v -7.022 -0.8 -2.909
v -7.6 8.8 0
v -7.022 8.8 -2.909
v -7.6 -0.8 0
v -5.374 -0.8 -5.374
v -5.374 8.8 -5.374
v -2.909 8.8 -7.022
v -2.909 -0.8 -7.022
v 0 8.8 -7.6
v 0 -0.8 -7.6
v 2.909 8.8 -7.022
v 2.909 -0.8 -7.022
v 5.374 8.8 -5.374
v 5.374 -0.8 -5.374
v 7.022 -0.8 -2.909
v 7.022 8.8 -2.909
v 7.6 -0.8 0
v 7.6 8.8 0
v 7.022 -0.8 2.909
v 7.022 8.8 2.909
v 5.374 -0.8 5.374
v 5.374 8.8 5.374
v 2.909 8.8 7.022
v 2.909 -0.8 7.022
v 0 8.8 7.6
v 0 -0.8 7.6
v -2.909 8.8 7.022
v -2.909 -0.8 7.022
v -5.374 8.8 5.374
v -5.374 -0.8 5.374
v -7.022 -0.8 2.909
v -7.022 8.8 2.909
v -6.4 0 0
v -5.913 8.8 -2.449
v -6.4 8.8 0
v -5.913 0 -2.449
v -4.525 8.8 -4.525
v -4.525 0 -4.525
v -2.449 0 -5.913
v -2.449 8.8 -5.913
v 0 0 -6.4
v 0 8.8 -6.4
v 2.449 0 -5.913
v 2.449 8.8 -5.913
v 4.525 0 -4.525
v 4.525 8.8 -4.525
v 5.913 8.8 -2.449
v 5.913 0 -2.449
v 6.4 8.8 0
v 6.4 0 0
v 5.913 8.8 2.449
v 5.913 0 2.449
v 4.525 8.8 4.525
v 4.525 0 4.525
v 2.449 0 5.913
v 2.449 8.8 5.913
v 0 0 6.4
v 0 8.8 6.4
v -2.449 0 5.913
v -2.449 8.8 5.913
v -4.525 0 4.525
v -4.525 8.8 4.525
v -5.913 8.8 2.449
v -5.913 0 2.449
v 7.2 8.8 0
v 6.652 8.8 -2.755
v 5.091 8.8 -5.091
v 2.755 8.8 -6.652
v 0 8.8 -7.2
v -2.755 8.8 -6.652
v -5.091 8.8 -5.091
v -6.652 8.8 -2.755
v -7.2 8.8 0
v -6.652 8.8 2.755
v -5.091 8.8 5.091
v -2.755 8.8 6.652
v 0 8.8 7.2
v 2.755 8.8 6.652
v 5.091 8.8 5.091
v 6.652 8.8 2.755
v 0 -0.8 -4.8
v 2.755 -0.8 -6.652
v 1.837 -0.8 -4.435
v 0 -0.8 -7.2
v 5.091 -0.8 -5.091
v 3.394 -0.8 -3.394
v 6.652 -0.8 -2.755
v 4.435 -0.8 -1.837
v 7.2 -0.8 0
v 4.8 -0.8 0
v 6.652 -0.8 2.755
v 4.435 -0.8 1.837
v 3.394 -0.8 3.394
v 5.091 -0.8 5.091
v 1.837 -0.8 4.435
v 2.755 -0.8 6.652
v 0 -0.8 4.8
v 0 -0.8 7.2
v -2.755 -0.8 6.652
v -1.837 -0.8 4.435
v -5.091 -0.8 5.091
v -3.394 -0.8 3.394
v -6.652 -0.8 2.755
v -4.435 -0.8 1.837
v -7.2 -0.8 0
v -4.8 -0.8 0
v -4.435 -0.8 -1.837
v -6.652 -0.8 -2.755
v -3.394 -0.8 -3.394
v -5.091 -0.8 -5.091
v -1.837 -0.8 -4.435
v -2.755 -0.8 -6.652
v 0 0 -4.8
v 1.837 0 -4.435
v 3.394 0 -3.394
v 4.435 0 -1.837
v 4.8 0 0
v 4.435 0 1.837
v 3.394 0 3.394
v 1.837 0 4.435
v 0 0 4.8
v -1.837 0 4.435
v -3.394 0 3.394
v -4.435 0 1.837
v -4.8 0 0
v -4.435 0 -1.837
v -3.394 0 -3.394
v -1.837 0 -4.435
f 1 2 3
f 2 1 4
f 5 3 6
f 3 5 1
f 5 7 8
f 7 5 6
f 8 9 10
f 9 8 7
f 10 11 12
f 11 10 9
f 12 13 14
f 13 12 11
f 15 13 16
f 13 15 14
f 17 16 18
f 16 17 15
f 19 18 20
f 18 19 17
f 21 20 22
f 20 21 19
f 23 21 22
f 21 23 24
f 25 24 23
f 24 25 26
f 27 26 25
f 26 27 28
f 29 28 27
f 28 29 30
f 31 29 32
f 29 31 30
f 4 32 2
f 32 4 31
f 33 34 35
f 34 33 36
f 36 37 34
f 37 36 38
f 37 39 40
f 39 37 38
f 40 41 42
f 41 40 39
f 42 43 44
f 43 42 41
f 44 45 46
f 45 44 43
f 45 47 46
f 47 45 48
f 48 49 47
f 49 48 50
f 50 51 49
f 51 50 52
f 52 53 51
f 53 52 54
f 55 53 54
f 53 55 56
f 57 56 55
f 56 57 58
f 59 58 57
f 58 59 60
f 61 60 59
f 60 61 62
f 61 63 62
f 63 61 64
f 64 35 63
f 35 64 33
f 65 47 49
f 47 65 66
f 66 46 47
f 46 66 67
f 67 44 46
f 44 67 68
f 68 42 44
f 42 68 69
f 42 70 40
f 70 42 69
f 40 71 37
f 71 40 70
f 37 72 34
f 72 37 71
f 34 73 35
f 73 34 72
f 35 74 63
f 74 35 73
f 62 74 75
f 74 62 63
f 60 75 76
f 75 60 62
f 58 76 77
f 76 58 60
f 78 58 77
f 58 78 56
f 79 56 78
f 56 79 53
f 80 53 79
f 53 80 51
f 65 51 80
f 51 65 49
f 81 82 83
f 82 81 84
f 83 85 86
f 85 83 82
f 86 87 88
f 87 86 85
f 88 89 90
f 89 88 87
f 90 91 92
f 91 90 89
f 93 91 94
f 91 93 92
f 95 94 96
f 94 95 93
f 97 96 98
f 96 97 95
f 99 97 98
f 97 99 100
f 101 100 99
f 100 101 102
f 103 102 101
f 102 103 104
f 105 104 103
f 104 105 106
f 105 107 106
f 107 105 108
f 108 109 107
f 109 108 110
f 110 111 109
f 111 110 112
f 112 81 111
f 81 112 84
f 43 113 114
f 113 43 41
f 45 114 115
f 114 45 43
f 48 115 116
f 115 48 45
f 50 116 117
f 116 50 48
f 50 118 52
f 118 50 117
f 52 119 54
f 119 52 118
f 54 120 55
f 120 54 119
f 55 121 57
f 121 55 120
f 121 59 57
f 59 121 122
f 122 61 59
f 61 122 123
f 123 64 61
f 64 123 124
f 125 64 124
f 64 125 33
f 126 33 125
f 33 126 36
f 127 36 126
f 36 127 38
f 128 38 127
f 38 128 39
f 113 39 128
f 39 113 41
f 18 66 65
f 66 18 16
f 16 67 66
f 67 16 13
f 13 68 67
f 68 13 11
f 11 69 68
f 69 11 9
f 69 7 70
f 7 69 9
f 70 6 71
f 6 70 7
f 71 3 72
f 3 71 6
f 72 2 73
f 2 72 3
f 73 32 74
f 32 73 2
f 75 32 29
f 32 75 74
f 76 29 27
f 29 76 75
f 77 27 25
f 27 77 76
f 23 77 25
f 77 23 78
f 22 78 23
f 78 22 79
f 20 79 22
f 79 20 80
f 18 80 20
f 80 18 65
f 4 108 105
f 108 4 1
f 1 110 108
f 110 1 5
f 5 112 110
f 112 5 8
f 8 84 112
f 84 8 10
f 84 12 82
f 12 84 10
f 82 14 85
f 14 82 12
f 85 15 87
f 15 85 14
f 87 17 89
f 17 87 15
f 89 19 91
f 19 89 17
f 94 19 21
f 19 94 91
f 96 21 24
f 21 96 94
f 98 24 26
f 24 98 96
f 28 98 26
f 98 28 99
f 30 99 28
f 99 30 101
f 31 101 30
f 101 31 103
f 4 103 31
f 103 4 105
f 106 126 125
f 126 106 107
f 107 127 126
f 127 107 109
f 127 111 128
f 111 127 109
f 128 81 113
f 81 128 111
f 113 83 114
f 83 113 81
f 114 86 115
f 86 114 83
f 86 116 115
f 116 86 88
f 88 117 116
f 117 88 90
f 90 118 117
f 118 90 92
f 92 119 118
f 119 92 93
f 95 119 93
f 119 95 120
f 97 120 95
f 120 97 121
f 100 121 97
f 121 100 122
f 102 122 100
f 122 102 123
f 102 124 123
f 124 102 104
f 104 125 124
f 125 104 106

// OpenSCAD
// file: ../p/4-4edge.scad
use <../lib.scad>
function ldraw_lib__4_4edge() = [
// 0 Circle 1.0
// 0 Name: 4-4edge.dat
// 0 Author: James Jessiman
// 0 !LDRAW_ORG Primitive UPDATE 2017-01
// 0 !LICENSE Licensed under CC BY 4.0 : see CAreadme.txt
// 
// 0 BFC CERTIFY CCW
  [0,"BFC","CERTIFY"],
  [0,"BFC","CCW"],
// 
// 0 !HISTORY 1998-12-15 [PTadmin] Official Update 1998-10
// 0 !HISTORY 2005-12-28 [PTadmin] Official Update 2005-01
// 0 !HISTORY 2007-06-24 [PTadmin] Header formatted for Contributor Agreement
// 0 !HISTORY 2008-07-01 [PTadmin] Official Update 2008-01
// 0 !HISTORY 2017-01-15 [Steffen] BFCed
// 0 !HISTORY 2017-12-30 [PTadmin] Official Update 2017-01
// 
// 
// 2 24 1 0 0 0.9239 0 0.3827
  [2,24,1,0,0,0.9239,0,0.3827],
// 2 24 0.9239 0 0.3827 0.7071 0 0.7071
  [2,24,0.9239,0,0.3827,0.7071,0,0.7071],
// 2 24 0.7071 0 0.7071 0.3827 0 0.9239
  [2,24,0.7071,0,0.7071,0.3827,0,0.9239],
// 2 24 0.3827 0 0.9239 0 0 1
  [2,24,0.3827,0,0.9239,0,0,1],
// 2 24 0 0 1 -0.3827 0 0.9239
  [2,24,0,0,1,-0.3827,0,0.9239],
// 2 24 -0.3827 0 0.9239 -0.7071 0 0.7071
  [2,24,-0.3827,0,0.9239,-0.7071,0,0.7071],
// 2 24 -0.7071 0 0.7071 -0.9239 0 0.3827
  [2,24,-0.7071,0,0.7071,-0.9239,0,0.3827],
// 2 24 -0.9239 0 0.3827 -1 0 -0
  [2,24,-0.9239,0,0.3827,-1,0,-0],
// 2 24 -1 0 -0 -0.9239 0 -0.3827
  [2,24,-1,0,-0,-0.9239,0,-0.3827],
// 2 24 -0.9239 0 -0.3827 -0.7071 0 -0.7071
  [2,24,-0.9239,0,-0.3827,-0.7071,0,-0.7071],
// 2 24 -0.7071 0 -0.7071 -0.3827 0 -0.9239
  [2,24,-0.7071,0,-0.7071,-0.3827,0,-0.9239],
// 2 24 -0.3827 0 -0.9239 0 0 -1
  [2,24,-0.3827,0,-0.9239,0,0,-1],
// 2 24 0 0 -1 0.3827 0 -0.9239
  [2,24,0,0,-1,0.3827,0,-0.9239],
// 2 24 0.3827 0 -0.9239 0.7071 0 -0.7071
  [2,24,0.3827,0,-0.9239,0.7071,0,-0.7071],
// 2 24 0.7071 0 -0.7071 0.9239 0 -0.3827
  [2,24,0.7071,0,-0.7071,0.9239,0,-0.3827],
// 2 24 0.9239 0 -0.3827 1 0 0
  [2,24,0.9239,0,-0.3827,1,0,0],
];
module ldraw_lib__4_4edge(step=0, col=false, unit=2/5, alt=false, line=0.2, solid=!$preview)
    makepoly(ldraw_lib__4_4edge(), step=step, col=col, unit=unit, alt=alt, line=line, solid=solid);
ldraw_lib__4_4edge(line=0.2);
// file: ../p/4-4cyli.scad
use <../lib.scad>
function ldraw_lib__4_4cyli() = [
// 0 Cylinder 1.0
// 0 Name: 4-4cyli.dat
// 0 Author: James Jessiman
// 0 !LDRAW_ORG Primitive UPDATE 2005-01
// 0 !LICENSE Licensed under CC BY 4.0 : see CAreadme.txt
// 
// 0 BFC CERTIFY CCW
  [0,"BFC","CERTIFY"],
  [0,"BFC","CCW"],
// 
// 0 !HISTORY 1998-12-15 [PTadmin] Official Update 1998-10
// 0 !HISTORY 2002-03-23 [sbliss] Added BFC statement; merged headers from files in distributions LDraw 0.27 and Complete.
// 0 !HISTORY 2002-04-25 [PTadmin] Official Update 2002-02
// 0 !HISTORY 2004-12-14 [guyvivan] BFC CCW
// 0 !HISTORY 2005-12-28 [PTadmin] Official Update 2005-01
// 0 !HISTORY 2007-06-24 [PTadmin] Header formatted for Contributor Agreement
// 0 !HISTORY 2008-07-01 [PTadmin] Official Update 2008-01
// 
// 
// 4 16 1 1 0 0.9239 1 0.3827 0.9239 0 0.3827 1 0 0
  [4,16,1,1,0,0.9239,1,0.3827,0.9239,0,0.3827,1,0,0],
// 5 24 1 0 0 1 1 0 0.9239 0 0.3827 0.9239 0 -0.3827
  [5,24,1,0,0,1,1,0,0.9239,0,0.3827,0.9239,0,-0.3827],
// 4 16 0.9239 1 0.3827 0.7071 1 0.7071 0.7071 0 0.7071 0.9239 0 0.3827
  [4,16,0.9239,1,0.3827,0.7071,1,0.7071,0.7071,0,0.7071,0.9239,0,0.3827],
// 5 24 0.9239 0 0.3827 0.9239 1 0.3827 0.7071 0 0.7071 1 0 0
  [5,24,0.9239,0,0.3827,0.9239,1,0.3827,0.7071,0,0.7071,1,0,0],
// 4 16 0.7071 1 0.7071 0.3827 1 0.9239 0.3827 0 0.9239 0.7071 0 0.7071
  [4,16,0.7071,1,0.7071,0.3827,1,0.9239,0.3827,0,0.9239,0.7071,0,0.7071],
// 5 24 0.7071 0 0.7071 0.7071 1 0.7071 0.3827 0 0.9239 0.9239 0 0.3827
  [5,24,0.7071,0,0.7071,0.7071,1,0.7071,0.3827,0,0.9239,0.9239,0,0.3827],
// 4 16 0.3827 1 0.9239 0 1 1 0 0 1 0.3827 0 0.9239
  [4,16,0.3827,1,0.9239,0,1,1,0,0,1,0.3827,0,0.9239],
// 5 24 0.3827 0 0.9239 0.3827 1 0.9239 0 0 1 0.7071 0 0.7071
  [5,24,0.3827,0,0.9239,0.3827,1,0.9239,0,0,1,0.7071,0,0.7071],
// 4 16 0 1 1 -0.3827 1 0.9239 -0.3827 0 0.9239 0 0 1
  [4,16,0,1,1,-0.3827,1,0.9239,-0.3827,0,0.9239,0,0,1],
// 5 24 0 0 1 0 1 1 -0.3827 0 0.9239 0.3827 0 0.9239
  [5,24,0,0,1,0,1,1,-0.3827,0,0.9239,0.3827,0,0.9239],
// 4 16 -0.3827 1 0.9239 -0.7071 1 0.7071 -0.7071 0 0.7071 -0.3827 0 0.9239
  [4,16,-0.3827,1,0.9239,-0.7071,1,0.7071,-0.7071,0,0.7071,-0.3827,0,0.9239],
// 5 24 -0.3827 0 0.9239 -0.3827 1 0.9239 -0.7071 0 0.7071 0 0 1
  [5,24,-0.3827,0,0.9239,-0.3827,1,0.9239,-0.7071,0,0.7071,0,0,1],
// 4 16 -0.7071 1 0.7071 -0.9239 1 0.3827 -0.9239 0 0.3827 -0.7071 0 0.7071
  [4,16,-0.7071,1,0.7071,-0.9239,1,0.3827,-0.9239,0,0.3827,-0.7071,0,0.7071],
// 5 24 -0.7071 0 0.7071 -0.7071 1 0.7071 -0.9239 0 0.3827 -0.3827 0 0.9239
  [5,24,-0.7071,0,0.7071,-0.7071,1,0.7071,-0.9239,0,0.3827,-0.3827,0,0.9239],
// 4 16 -0.9239 1 0.3827 -1 1 0 -1 0 0 -0.9239 0 0.3827
  [4,16,-0.9239,1,0.3827,-1,1,0,-1,0,0,-0.9239,0,0.3827],
// 5 24 -0.9239 0 0.3827 -0.9239 1 0.3827 -1 0 0 -0.7071 0 0.7071
  [5,24,-0.9239,0,0.3827,-0.9239,1,0.3827,-1,0,0,-0.7071,0,0.7071],
// 4 16 -1 1 0 -0.9239 1 -0.3827 -0.9239 0 -0.3827 -1 0 0
  [4,16,-1,1,0,-0.9239,1,-0.3827,-0.9239,0,-0.3827,-1,0,0],
// 5 24 -1 0 0 -1 1 0 -0.9239 0 -0.3827 -0.9239 0 0.3827
  [5,24,-1,0,0,-1,1,0,-0.9239,0,-0.3827,-0.9239,0,0.3827],
// 4 16 -0.9239 1 -0.3827 -0.7071 1 -0.7071 -0.7071 0 -0.7071 -0.9239 0 -0.3827
  [4,16,-0.9239,1,-0.3827,-0.7071,1,-0.7071,-0.7071,0,-0.7071,-0.9239,0,-0.3827],
// 5 24 -0.9239 0 -0.3827 -0.9239 1 -0.3827 -0.7071 0 -0.7071 -1 0 0
  [5,24,-0.9239,0,-0.3827,-0.9239,1,-0.3827,-0.7071,0,-0.7071,-1,0,0],
// 4 16 -0.7071 1 -0.7071 -0.3827 1 -0.9239 -0.3827 0 -0.9239 -0.7071 0 -0.7071
  [4,16,-0.7071,1,-0.7071,-0.3827,1,-0.9239,-0.3827,0,-0.9239,-0.7071,0,-0.7071],
// 5 24 -0.7071 0 -0.7071 -0.7071 1 -0.7071 -0.3827 0 -0.9239 -0.9239 0 -0.3827
  [5,24,-0.7071,0,-0.7071,-0.7071,1,-0.7071,-0.3827,0,-0.9239,-0.9239,0,-0.3827],
// 4 16 -0.3827 1 -0.9239 0 1 -1 0 0 -1 -0.3827 0 -0.9239
  [4,16,-0.3827,1,-0.9239,0,1,-1,0,0,-1,-0.3827,0,-0.9239],
// 5 24 -0.3827 0 -0.9239 -0.3827 1 -0.9239 0 0 -1 -0.7071 0 -0.7071
  [5,24,-0.3827,0,-0.9239,-0.3827,1,-0.9239,0,0,-1,-0.7071,0,-0.7071],
// 4 16 0 1 -1 0.3827 1 -0.9239 0.3827 0 -0.9239 0 0 -1
  [4,16,0,1,-1,0.3827,1,-0.9239,0.3827,0,-0.9239,0,0,-1],
// 5 24 0 0 -1 0 1 -1 0.3827 0 -0.9239 -0.3827 0 -0.9239
  [5,24,0,0,-1,0,1,-1,0.3827,0,-0.9239,-0.3827,0,-0.9239],
// 4 16 0.3827 1 -0.9239 0.7071 1 -0.7071 0.7071 0 -0.7071 0.3827 0 -0.9239
  [4,16,0.3827,1,-0.9239,0.7071,1,-0.7071,0.7071,0,-0.7071,0.3827,0,-0.9239],
// 5 24 0.3827 0 -0.9239 0.3827 1 -0.9239 0.7071 0 -0.7071 0 0 -1
  [5,24,0.3827,0,-0.9239,0.3827,1,-0.9239,0.7071,0,-0.7071,0,0,-1],
// 4 16 0.7071 1 -0.7071 0.9239 1 -0.3827 0.9239 0 -0.3827 0.7071 0 -0.7071
  [4,16,0.7071,1,-0.7071,0.9239,1,-0.3827,0.9239,0,-0.3827,0.7071,0,-0.7071],
// 5 24 0.7071 0 -0.7071 0.7071 1 -0.7071 0.9239 0 -0.3827 0.3827 0 -0.9239
  [5,24,0.7071,0,-0.7071,0.7071,1,-0.7071,0.9239,0,-0.3827,0.3827,0,-0.9239],
// 4 16 0.9239 1 -0.3827 1 1 0 1 0 0 0.9239 0 -0.3827
  [4,16,0.9239,1,-0.3827,1,1,0,1,0,0,0.9239,0,-0.3827],
// 5 24 0.9239 0 -0.3827 0.9239 1 -0.3827 1 0 0 0.7071 0 -0.7071
  [5,24,0.9239,0,-0.3827,0.9239,1,-0.3827,1,0,0,0.7071,0,-0.7071],
// 0
];
module ldraw_lib__4_4cyli(step=0, col=false, unit=2/5, alt=false, line=0.2, solid=!$preview)
    makepoly(ldraw_lib__4_4cyli(), step=step, col=col, unit=unit, alt=alt, line=line, solid=solid);
ldraw_lib__4_4cyli(line=0.2);
// file: ../p/4-4ring8.scad
use <../lib.scad>
function ldraw_lib__4_4ring8() = [
// 0 Ring  8 x 1.0
// 0 Name: 4-4ring8.dat
// 0 Author: Steffen [Steffen]
// 0 !LDRAW_ORG Primitive UPDATE 2012-01
// 0 !LICENSE Licensed under CC BY 4.0 : see CAreadme.txt
// 
// 0 BFC CERTIFY CCW
  [0,"BFC","CERTIFY"],
  [0,"BFC","CCW"],
// 
// 0 !HISTORY 2003-12-19 [PTadmin] Official Update 2003-03
// 0 !HISTORY 2007-06-24 [PTadmin] Header formatted for Contributor Agreement
// 0 !HISTORY 2008-07-01 [PTadmin] Official Update 2008-01
// 0 !HISTORY 2012-02-16 [Philo] Changed to CCW
// 0 !HISTORY 2012-03-30 [PTadmin] Official Update 2012-01
// 
// 
// 4 16 9 0 0 8.3151 0 3.4443 7.3912 0 3.0616 8 0 0
  [4,16,9,0,0,8.3151,0,3.4443,7.3912,0,3.0616,8,0,0],
// 4 16 8.3151 0 3.4443 6.3639 0 6.3639 5.6568 0 5.6568 7.3912 0 3.0616
  [4,16,8.3151,0,3.4443,6.3639,0,6.3639,5.6568,0,5.6568,7.3912,0,3.0616],
// 4 16 6.3639 0 6.3639 3.4443 0 8.3151 3.0616 0 7.3912 5.6568 0 5.6568
  [4,16,6.3639,0,6.3639,3.4443,0,8.3151,3.0616,0,7.3912,5.6568,0,5.6568],
// 4 16 3.4443 0 8.3151 0 0 9 0 0 8 3.0616 0 7.3912
  [4,16,3.4443,0,8.3151,0,0,9,0,0,8,3.0616,0,7.3912],
// 4 16 0 0 9 -3.4443 0 8.3151 -3.0616 0 7.3912 0 0 8
  [4,16,0,0,9,-3.4443,0,8.3151,-3.0616,0,7.3912,0,0,8],
// 4 16 -3.4443 0 8.3151 -6.3639 0 6.3639 -5.6568 0 5.6568 -3.0616 0 7.3912
  [4,16,-3.4443,0,8.3151,-6.3639,0,6.3639,-5.6568,0,5.6568,-3.0616,0,7.3912],
// 4 16 -6.3639 0 6.3639 -8.3151 0 3.4443 -7.3912 0 3.0616 -5.6568 0 5.6568
  [4,16,-6.3639,0,6.3639,-8.3151,0,3.4443,-7.3912,0,3.0616,-5.6568,0,5.6568],
// 4 16 -8.3151 0 3.4443 -9 0 0 -8 0 0 -7.3912 0 3.0616
  [4,16,-8.3151,0,3.4443,-9,0,0,-8,0,0,-7.3912,0,3.0616],
// 4 16 -9 0 0 -8.3151 0 -3.4443 -7.3912 0 -3.0616 -8 0 0
  [4,16,-9,0,0,-8.3151,0,-3.4443,-7.3912,0,-3.0616,-8,0,0],
// 4 16 -8.3151 0 -3.4443 -6.3639 0 -6.3639 -5.6568 0 -5.6568 -7.3912 0 -3.0616
  [4,16,-8.3151,0,-3.4443,-6.3639,0,-6.3639,-5.6568,0,-5.6568,-7.3912,0,-3.0616],
// 4 16 -6.3639 0 -6.3639 -3.4443 0 -8.3151 -3.0616 0 -7.3912 -5.6568 0 -5.6568
  [4,16,-6.3639,0,-6.3639,-3.4443,0,-8.3151,-3.0616,0,-7.3912,-5.6568,0,-5.6568],
// 4 16 -3.4443 0 -8.3151 0 0 -9 0 0 -8 -3.0616 0 -7.3912
  [4,16,-3.4443,0,-8.3151,0,0,-9,0,0,-8,-3.0616,0,-7.3912],
// 4 16 0 0 -9 3.4443 0 -8.3151 3.0616 0 -7.3912 0 0 -8
  [4,16,0,0,-9,3.4443,0,-8.3151,3.0616,0,-7.3912,0,0,-8],
// 4 16 3.4443 0 -8.3151 6.3639 0 -6.3639 5.6568 0 -5.6568 3.0616 0 -7.3912
  [4,16,3.4443,0,-8.3151,6.3639,0,-6.3639,5.6568,0,-5.6568,3.0616,0,-7.3912],
// 4 16 6.3639 0 -6.3639 8.3151 0 -3.4443 7.3912 0 -3.0616 5.6568 0 -5.6568
  [4,16,6.3639,0,-6.3639,8.3151,0,-3.4443,7.3912,0,-3.0616,5.6568,0,-5.6568],
// 4 16 8.3151 0 -3.4443 9 0 0 8 0 0 7.3912 0 -3.0616
  [4,16,8.3151,0,-3.4443,9,0,0,8,0,0,7.3912,0,-3.0616],
];
module ldraw_lib__4_4ring8(step=0, col=false, unit=2/5, alt=false, line=0.2, solid=!$preview)
    makepoly(ldraw_lib__4_4ring8(), step=step, col=col, unit=unit, alt=alt, line=line, solid=solid);
ldraw_lib__4_4ring8(line=0.2);
// file: ../p/4-4ring3.scad
use <../lib.scad>
function ldraw_lib__4_4ring3() = [
// 0 Ring  3 x 1.0
// 0 Name: 4-4ring3.dat
// 0 Author: James Jessiman
// 0 !LDRAW_ORG Primitive UPDATE 2009-01
// 0 !LICENSE Licensed under CC BY 4.0 : see CAreadme.txt
// 
// 0 BFC CERTIFY CCW
  [0,"BFC","CERTIFY"],
  [0,"BFC","CCW"],
// 
// 0 !HISTORY 1998-12-15 [PTadmin] Official Update 1998-10
// 0 !HISTORY 2002-04-05 [hafhead] Added BFC statement
// 0 !HISTORY 2002-04-25 [PTadmin] Official Update 2002-02
// 0 !HISTORY 2007-06-24 [PTadmin] Header formatted for Contributor Agreement
// 0 !HISTORY 2008-07-01 [PTadmin] Official Update 2008-01
// 0 !HISTORY 2008-08-26 [cwdee] Switch polygon winding and rename
// 0 !HISTORY 2009-05-02 [PTadmin] Official Update 2009-01
// 
// 
// 4 16 -1.5308 0 3.6956 -1.1481 0 2.7717 0 0 3 0 0 4
  [4,16,-1.5308,0,3.6956,-1.1481,0,2.7717,0,0,3,0,0,4],
// 4 16 -2.8284 0 2.8284 -2.1213 0 2.1213 -1.1481 0 2.7717 -1.5308 0 3.6956
  [4,16,-2.8284,0,2.8284,-2.1213,0,2.1213,-1.1481,0,2.7717,-1.5308,0,3.6956],
// 4 16 -3.6956 0 1.5308 -2.7717 0 1.1481 -2.1213 0 2.1213 -2.8284 0 2.8284
  [4,16,-3.6956,0,1.5308,-2.7717,0,1.1481,-2.1213,0,2.1213,-2.8284,0,2.8284],
// 4 16 -4 0 0 -3 0 0 -2.7717 0 1.1481 -3.6956 0 1.5308
  [4,16,-4,0,0,-3,0,0,-2.7717,0,1.1481,-3.6956,0,1.5308],
// 4 16 -3.6956 0 -1.5308 -2.7717 0 -1.1481 -3 0 0 -4 0 0
  [4,16,-3.6956,0,-1.5308,-2.7717,0,-1.1481,-3,0,0,-4,0,0],
// 4 16 -2.8284 0 -2.8284 -2.1213 0 -2.1213 -2.7717 0 -1.1481 -3.6956 0 -1.5308
  [4,16,-2.8284,0,-2.8284,-2.1213,0,-2.1213,-2.7717,0,-1.1481,-3.6956,0,-1.5308],
// 4 16 -1.5308 0 -3.6956 -1.1481 0 -2.7717 -2.1213 0 -2.1213 -2.8284 0 -2.8284
  [4,16,-1.5308,0,-3.6956,-1.1481,0,-2.7717,-2.1213,0,-2.1213,-2.8284,0,-2.8284],
// 4 16 0 0 -4 0 0 -3 -1.1481 0 -2.7717 -1.5308 0 -3.6956
  [4,16,0,0,-4,0,0,-3,-1.1481,0,-2.7717,-1.5308,0,-3.6956],
// 4 16 1.5308 0 -3.6956 1.1481 0 -2.7717 0 0 -3 0 0 -4
  [4,16,1.5308,0,-3.6956,1.1481,0,-2.7717,0,0,-3,0,0,-4],
// 4 16 2.8284 0 -2.8284 2.1213 0 -2.1213 1.1481 0 -2.7717 1.5308 0 -3.6956
  [4,16,2.8284,0,-2.8284,2.1213,0,-2.1213,1.1481,0,-2.7717,1.5308,0,-3.6956],
// 4 16 3.6956 0 -1.5308 2.7717 0 -1.1481 2.1213 0 -2.1213 2.8284 0 -2.8284
  [4,16,3.6956,0,-1.5308,2.7717,0,-1.1481,2.1213,0,-2.1213,2.8284,0,-2.8284],
// 4 16 4 0 0 3 0 0 2.7717 0 -1.1481 3.6956 0 -1.5308
  [4,16,4,0,0,3,0,0,2.7717,0,-1.1481,3.6956,0,-1.5308],
// 4 16 3.6956 0 1.5308 2.7717 0 1.1481 3 0 0 4 0 0
  [4,16,3.6956,0,1.5308,2.7717,0,1.1481,3,0,0,4,0,0],
// 4 16 2.8284 0 2.8284 2.1213 0 2.1213 2.7717 0 1.1481 3.6956 0 1.5308
  [4,16,2.8284,0,2.8284,2.1213,0,2.1213,2.7717,0,1.1481,3.6956,0,1.5308],
// 4 16 1.5308 0 3.6956 1.1481 0 2.7717 2.1213 0 2.1213 2.8284 0 2.8284
  [4,16,1.5308,0,3.6956,1.1481,0,2.7717,2.1213,0,2.1213,2.8284,0,2.8284],
// 4 16 0 0 4 0 0 3 1.1481 0 2.7717 1.5308 0 3.6956
  [4,16,0,0,4,0,0,3,1.1481,0,2.7717,1.5308,0,3.6956],
// 0
];
module ldraw_lib__4_4ring3(step=0, col=false, unit=2/5, alt=false, line=0.2, solid=!$preview)
    makepoly(ldraw_lib__4_4ring3(), step=step, col=col, unit=unit, alt=alt, line=line, solid=solid);
ldraw_lib__4_4ring3(line=0.2);
// file: ../p/4-4ring2.scad
use <../lib.scad>
function ldraw_lib__4_4ring2() = [
// 0 Ring  2 x 1.0
// 0 Name: 4-4ring2.dat
// 0 Author: James Jessiman
// 0 !LDRAW_ORG Primitive UPDATE 2009-01
// 0 !LICENSE Licensed under CC BY 4.0 : see CAreadme.txt
// 
// 0 BFC CERTIFY CCW
  [0,"BFC","CERTIFY"],
  [0,"BFC","CCW"],
// 
// 0 !HISTORY 1998-12-15 [PTadmin] Official Update 1998-10
// 0 !HISTORY 2002-04-05 [hafhead] Added BFC statement
// 0 !HISTORY 2002-04-25 [PTadmin] Official Update 2002-02
// 0 !HISTORY 2007-06-24 [PTadmin] Header formatted for Contributor Agreement
// 0 !HISTORY 2008-07-01 [PTadmin] Official Update 2008-01
// 0 !HISTORY 2008-08-26 [cwdee] Switch polygon winding and rename
// 0 !HISTORY 2009-05-02 [PTadmin] Official Update 2009-01
// 
// 
// 4 16 -1.1481 0 2.7717 -0.7654 0 1.8478 0 0 2 0 0 3
  [4,16,-1.1481,0,2.7717,-0.7654,0,1.8478,0,0,2,0,0,3],
// 4 16 -2.1213 0 2.1213 -1.4142 0 1.4142 -0.7654 0 1.8478 -1.1481 0 2.7717
  [4,16,-2.1213,0,2.1213,-1.4142,0,1.4142,-0.7654,0,1.8478,-1.1481,0,2.7717],
// 4 16 -2.7717 0 1.1481 -1.8478 0 0.7654 -1.4142 0 1.4142 -2.1213 0 2.1213
  [4,16,-2.7717,0,1.1481,-1.8478,0,0.7654,-1.4142,0,1.4142,-2.1213,0,2.1213],
// 4 16 -3 0 0 -2 0 0 -1.8478 0 0.7654 -2.7717 0 1.1481
  [4,16,-3,0,0,-2,0,0,-1.8478,0,0.7654,-2.7717,0,1.1481],
// 4 16 -2.7717 0 -1.1481 -1.8478 0 -0.7654 -2 0 0 -3 0 0
  [4,16,-2.7717,0,-1.1481,-1.8478,0,-0.7654,-2,0,0,-3,0,0],
// 4 16 -2.1213 0 -2.1213 -1.4142 0 -1.4142 -1.8478 0 -0.7654 -2.7717 0 -1.1481
  [4,16,-2.1213,0,-2.1213,-1.4142,0,-1.4142,-1.8478,0,-0.7654,-2.7717,0,-1.1481],
// 4 16 -1.1481 0 -2.7717 -0.7654 0 -1.8478 -1.4142 0 -1.4142 -2.1213 0 -2.1213
  [4,16,-1.1481,0,-2.7717,-0.7654,0,-1.8478,-1.4142,0,-1.4142,-2.1213,0,-2.1213],
// 4 16 0 0 -3 0 0 -2 -0.7654 0 -1.8478 -1.1481 0 -2.7717
  [4,16,0,0,-3,0,0,-2,-0.7654,0,-1.8478,-1.1481,0,-2.7717],
// 4 16 1.1481 0 -2.7717 0.7654 0 -1.8478 0 0 -2 0 0 -3
  [4,16,1.1481,0,-2.7717,0.7654,0,-1.8478,0,0,-2,0,0,-3],
// 4 16 2.1213 0 -2.1213 1.4142 0 -1.4142 0.7654 0 -1.8478 1.1481 0 -2.7717
  [4,16,2.1213,0,-2.1213,1.4142,0,-1.4142,0.7654,0,-1.8478,1.1481,0,-2.7717],
// 4 16 2.7717 0 -1.1481 1.8478 0 -0.7654 1.4142 0 -1.4142 2.1213 0 -2.1213
  [4,16,2.7717,0,-1.1481,1.8478,0,-0.7654,1.4142,0,-1.4142,2.1213,0,-2.1213],
// 4 16 3 0 0 2 0 0 1.8478 0 -0.7654 2.7717 0 -1.1481
  [4,16,3,0,0,2,0,0,1.8478,0,-0.7654,2.7717,0,-1.1481],
// 4 16 2.7717 0 1.1481 1.8478 0 0.7654 2 0 0 3 0 0
  [4,16,2.7717,0,1.1481,1.8478,0,0.7654,2,0,0,3,0,0],
// 4 16 2.1213 0 2.1213 1.4142 0 1.4142 1.8478 0 0.7654 2.7717 0 1.1481
  [4,16,2.1213,0,2.1213,1.4142,0,1.4142,1.8478,0,0.7654,2.7717,0,1.1481],
// 4 16 1.1481 0 2.7717 0.7654 0 1.8478 1.4142 0 1.4142 2.1213 0 2.1213
  [4,16,1.1481,0,2.7717,0.7654,0,1.8478,1.4142,0,1.4142,2.1213,0,2.1213],
// 4 16 0 0 3 0 0 2 0.7654 0 1.8478 1.1481 0 2.7717
  [4,16,0,0,3,0,0,2,0.7654,0,1.8478,1.1481,0,2.7717],
// 0
];
module ldraw_lib__4_4ring2(step=0, col=false, unit=2/5, alt=false, line=0.2, solid=!$preview)
    makepoly(ldraw_lib__4_4ring2(), step=step, col=col, unit=unit, alt=alt, line=line, solid=solid);
ldraw_lib__4_4ring2(line=0.2);
// file: ../p/4-4ring18.scad
use <../lib.scad>
function ldraw_lib__4_4ring18() = [
// 0 Ring 18 x 1.0
// 0 Name: 4-4ring18.dat
// 0 Author: Willy Tschager [Holly-Wood]
// 0 !LDRAW_ORG Primitive UPDATE 2024-02
// 0 !LICENSE Licensed under CC BY 4.0 : see CAreadme.txt
// 
// 0 BFC CERTIFY CCW
  [0,"BFC","CERTIFY"],
  [0,"BFC","CCW"],
// 
// 0 !HISTORY 2009-12-29 [PTadmin] Official Update 2009-03
// 0 !HISTORY 2024-01-11 [Holly-Wood] Complete regeneration, original by guyvivan
// 0 !HISTORY 2024-03-24 [OrionP] Official Update 2024-02
// 
// 4 16 19 0 0 17.5541 0 7.2713 16.6302 0 6.8886 18 0 0
  [4,16,19,0,0,17.5541,0,7.2713,16.6302,0,6.8886,18,0,0],
// 4 16 17.5541 0 7.2713 13.4349 0 13.4349 12.7278 0 12.7278 16.6302 0 6.8886
  [4,16,17.5541,0,7.2713,13.4349,0,13.4349,12.7278,0,12.7278,16.6302,0,6.8886],
// 4 16 13.4349 0 13.4349 7.2713 0 17.5541 6.8886 0 16.6302 12.7278 0 12.7278
  [4,16,13.4349,0,13.4349,7.2713,0,17.5541,6.8886,0,16.6302,12.7278,0,12.7278],
// 4 16 7.2713 0 17.5541 0 0 19 0 0 18 6.8886 0 16.6302
  [4,16,7.2713,0,17.5541,0,0,19,0,0,18,6.8886,0,16.6302],
// 4 16 0 0 19 -7.2713 0 17.5541 -6.8886 0 16.6302 0 0 18
  [4,16,0,0,19,-7.2713,0,17.5541,-6.8886,0,16.6302,0,0,18],
// 4 16 -7.2713 0 17.5541 -13.4349 0 13.4349 -12.7278 0 12.7278 -6.8886 0 16.6302
  [4,16,-7.2713,0,17.5541,-13.4349,0,13.4349,-12.7278,0,12.7278,-6.8886,0,16.6302],
// 4 16 -13.4349 0 13.4349 -17.5541 0 7.2713 -16.6302 0 6.8886 -12.7278 0 12.7278
  [4,16,-13.4349,0,13.4349,-17.5541,0,7.2713,-16.6302,0,6.8886,-12.7278,0,12.7278],
// 4 16 -17.5541 0 7.2713 -19 0 0 -18 0 0 -16.6302 0 6.8886
  [4,16,-17.5541,0,7.2713,-19,0,0,-18,0,0,-16.6302,0,6.8886],
// 4 16 -19 0 0 -17.5541 0 -7.2713 -16.6302 0 -6.8886 -18 0 0
  [4,16,-19,0,0,-17.5541,0,-7.2713,-16.6302,0,-6.8886,-18,0,0],
// 4 16 -17.5541 0 -7.2713 -13.4349 0 -13.4349 -12.7278 0 -12.7278 -16.6302 0 -6.8886
  [4,16,-17.5541,0,-7.2713,-13.4349,0,-13.4349,-12.7278,0,-12.7278,-16.6302,0,-6.8886],
// 4 16 -13.4349 0 -13.4349 -7.2713 0 -17.5541 -6.8886 0 -16.6302 -12.7278 0 -12.7278
  [4,16,-13.4349,0,-13.4349,-7.2713,0,-17.5541,-6.8886,0,-16.6302,-12.7278,0,-12.7278],
// 4 16 -7.2713 0 -17.5541 0 0 -19 0 0 -18 -6.8886 0 -16.6302
  [4,16,-7.2713,0,-17.5541,0,0,-19,0,0,-18,-6.8886,0,-16.6302],
// 4 16 0 0 -19 7.2713 0 -17.5541 6.8886 0 -16.6302 0 0 -18
  [4,16,0,0,-19,7.2713,0,-17.5541,6.8886,0,-16.6302,0,0,-18],
// 4 16 7.2713 0 -17.5541 13.4349 0 -13.4349 12.7278 0 -12.7278 6.8886 0 -16.6302
  [4,16,7.2713,0,-17.5541,13.4349,0,-13.4349,12.7278,0,-12.7278,6.8886,0,-16.6302],
// 4 16 13.4349 0 -13.4349 17.5541 0 -7.2713 16.6302 0 -6.8886 12.7278 0 -12.7278
  [4,16,13.4349,0,-13.4349,17.5541,0,-7.2713,16.6302,0,-6.8886,12.7278,0,-12.7278],
// 4 16 17.5541 0 -7.2713 19 0 0 18 0 0 16.6302 0 -6.8886
  [4,16,17.5541,0,-7.2713,19,0,0,18,0,0,16.6302,0,-6.8886],
// 0 // Build by LDPartEditor (PrimGen 2.X)
];
module ldraw_lib__4_4ring18(step=0, col=false, unit=2/5, alt=false, line=0.2, solid=!$preview)
    makepoly(ldraw_lib__4_4ring18(), step=step, col=col, unit=unit, alt=alt, line=line, solid=solid);
ldraw_lib__4_4ring18(line=0.2);
// file: ../p/4-4cylo.scad
use <../lib.scad>
use <4-4cyli.scad>
use <4-4edge.scad>
function ldraw_lib__4_4cylo() = [
// 0 Cylinder Open 1.0
// 0 Name: 4-4cylo.dat
// 0 Author: Mark Kennedy [mkennedy]
// 0 !LDRAW_ORG Primitive UPDATE 2010-01
// 0 !LICENSE Licensed under CC BY 4.0 : see CAreadme.txt
// 
// 0 BFC CERTIFY CCW
  [0,"BFC","CERTIFY"],
  [0,"BFC","CCW"],
// 
// 0 !HISTORY 2010-04-05 [PTadmin] Official Update 2010-01
// 
// 
// 1 16 0 0 0 1 0 0 0 1 0 0 0 1 4-4edge.dat
  [1,16,0,0,0,1,0,0,0,1,0,0,0,1, ldraw_lib__4_4edge()],
// 1 16 0 1 0 1 0 0 0 1 0 0 0 1 4-4edge.dat
  [1,16,0,1,0,1,0,0,0,1,0,0,0,1, ldraw_lib__4_4edge()],
// 1 16 0 0 0 1 0 0 0 1 0 0 0 1 4-4cyli.dat
  [1,16,0,0,0,1,0,0,0,1,0,0,0,1, ldraw_lib__4_4cyli()],
// 0
];
module ldraw_lib__4_4cylo(step=0, col=false, unit=2/5, alt=false, line=0.2, solid=!$preview)
    makepoly(ldraw_lib__4_4cylo(), step=step, col=col, unit=unit, alt=alt, line=line, solid=solid);
ldraw_lib__4_4cylo(line=0.2);
// main file
use <../lib.scad>
use <../p/4-4cylo.scad>
use <../p/4-4ring18.scad>
use <../p/4-4ring2.scad>
use <../p/4-4ring3.scad>
use <../p/4-4ring8.scad>
function ldraw_lib__99401() = [
// 0 ~Electric Mindstorms EV3 US Sensor Transducer Rubber Holder
// 0 Name: 99401.dat
// 0 Author: Philippe Hurbain [Philo]
// 0 !LDRAW_ORG Part UPDATE 2024-02
// 0 !LICENSE Licensed under CC BY 4.0 : see CAreadme.txt
// 
// 0 BFC CERTIFY CCW
  [0,"BFC","CERTIFY"],
  [0,"BFC","CCW"],
// 
// 0 !HISTORY 2012-05-20 {LEGO MINDSTORMS Team} Original part shape
// 0 !HISTORY 2012-06-18 [Philo] File preparation for LDraw Parts Tracker
// 0 !HISTORY 2013-12-23 [PTadmin] Official Update 2013-02
// 0 !HISTORY 2024-03-23 [OrionP] Updated ring primitives
// 0 !HISTORY 2024-03-24 [OrionP] Official Update 2024-02
// 
// 1 16 0 0 -2 -19 0 0 0 0 19 0 24 0 4-4cylo.dat
  [1,16,0,0,-2,-19,0,0,0,0,19,0,24,0, ldraw_lib__4_4cylo()],
// 0 BFC INVERTNEXT
  [0,"BFC","INVERTNEXT"],
// 1 16 0 0 0 -16 0 0 0 0 16 0 22 0 4-4cylo.dat
  [1,16,0,0,0,-16,0,0,0,0,16,0,22,0, ldraw_lib__4_4cylo()],
// 1 16 0 0 22 2 0 0 0 0 2 0 -1 0 4-4ring8.dat
  [1,16,0,0,22,2,0,0,0,0,2,0,-1,0, ldraw_lib__4_4ring8()],
// 1 16 0 0 -2 -6 0 0 0 0 6 0 1 0 4-4ring2.dat
  [1,16,0,0,-2,-6,0,0,0,0,6,0,1,0, ldraw_lib__4_4ring2()],
// 1 16 0 0 0 -4 0 0 0 0 4 0 -1 0 4-4ring3.dat
  [1,16,0,0,0,-4,0,0,0,0,4,0,-1,0, ldraw_lib__4_4ring3()],
// 1 16 0 0 22 1 0 0 0 0 1 0 -1 0 4-4ring18.dat
  [1,16,0,0,22,1,0,0,0,0,1,0,-1,0, ldraw_lib__4_4ring18()],
// 1 16 0 0 -2 -1 0 0 0 0 1 0 1 0 4-4ring18.dat
  [1,16,0,0,-2,-1,0,0,0,0,1,0,1,0, ldraw_lib__4_4ring18()],
// 0 BFC INVERTNEXT
  [0,"BFC","INVERTNEXT"],
// 1 16 0 0 -2 -12 0 0 0 0 12 0 2 0 4-4cylo.dat
  [1,16,0,0,-2,-12,0,0,0,0,12,0,2,0, ldraw_lib__4_4cylo()],
];
module ldraw_lib__99401(step=0, col=false, unit=2/5, alt=false, line=0.2, solid=!$preview)
    makepoly(ldraw_lib__99401(), step=step, col=col, unit=unit, alt=alt, line=line, solid=solid);
ldraw_lib__99401(line=0.2);
